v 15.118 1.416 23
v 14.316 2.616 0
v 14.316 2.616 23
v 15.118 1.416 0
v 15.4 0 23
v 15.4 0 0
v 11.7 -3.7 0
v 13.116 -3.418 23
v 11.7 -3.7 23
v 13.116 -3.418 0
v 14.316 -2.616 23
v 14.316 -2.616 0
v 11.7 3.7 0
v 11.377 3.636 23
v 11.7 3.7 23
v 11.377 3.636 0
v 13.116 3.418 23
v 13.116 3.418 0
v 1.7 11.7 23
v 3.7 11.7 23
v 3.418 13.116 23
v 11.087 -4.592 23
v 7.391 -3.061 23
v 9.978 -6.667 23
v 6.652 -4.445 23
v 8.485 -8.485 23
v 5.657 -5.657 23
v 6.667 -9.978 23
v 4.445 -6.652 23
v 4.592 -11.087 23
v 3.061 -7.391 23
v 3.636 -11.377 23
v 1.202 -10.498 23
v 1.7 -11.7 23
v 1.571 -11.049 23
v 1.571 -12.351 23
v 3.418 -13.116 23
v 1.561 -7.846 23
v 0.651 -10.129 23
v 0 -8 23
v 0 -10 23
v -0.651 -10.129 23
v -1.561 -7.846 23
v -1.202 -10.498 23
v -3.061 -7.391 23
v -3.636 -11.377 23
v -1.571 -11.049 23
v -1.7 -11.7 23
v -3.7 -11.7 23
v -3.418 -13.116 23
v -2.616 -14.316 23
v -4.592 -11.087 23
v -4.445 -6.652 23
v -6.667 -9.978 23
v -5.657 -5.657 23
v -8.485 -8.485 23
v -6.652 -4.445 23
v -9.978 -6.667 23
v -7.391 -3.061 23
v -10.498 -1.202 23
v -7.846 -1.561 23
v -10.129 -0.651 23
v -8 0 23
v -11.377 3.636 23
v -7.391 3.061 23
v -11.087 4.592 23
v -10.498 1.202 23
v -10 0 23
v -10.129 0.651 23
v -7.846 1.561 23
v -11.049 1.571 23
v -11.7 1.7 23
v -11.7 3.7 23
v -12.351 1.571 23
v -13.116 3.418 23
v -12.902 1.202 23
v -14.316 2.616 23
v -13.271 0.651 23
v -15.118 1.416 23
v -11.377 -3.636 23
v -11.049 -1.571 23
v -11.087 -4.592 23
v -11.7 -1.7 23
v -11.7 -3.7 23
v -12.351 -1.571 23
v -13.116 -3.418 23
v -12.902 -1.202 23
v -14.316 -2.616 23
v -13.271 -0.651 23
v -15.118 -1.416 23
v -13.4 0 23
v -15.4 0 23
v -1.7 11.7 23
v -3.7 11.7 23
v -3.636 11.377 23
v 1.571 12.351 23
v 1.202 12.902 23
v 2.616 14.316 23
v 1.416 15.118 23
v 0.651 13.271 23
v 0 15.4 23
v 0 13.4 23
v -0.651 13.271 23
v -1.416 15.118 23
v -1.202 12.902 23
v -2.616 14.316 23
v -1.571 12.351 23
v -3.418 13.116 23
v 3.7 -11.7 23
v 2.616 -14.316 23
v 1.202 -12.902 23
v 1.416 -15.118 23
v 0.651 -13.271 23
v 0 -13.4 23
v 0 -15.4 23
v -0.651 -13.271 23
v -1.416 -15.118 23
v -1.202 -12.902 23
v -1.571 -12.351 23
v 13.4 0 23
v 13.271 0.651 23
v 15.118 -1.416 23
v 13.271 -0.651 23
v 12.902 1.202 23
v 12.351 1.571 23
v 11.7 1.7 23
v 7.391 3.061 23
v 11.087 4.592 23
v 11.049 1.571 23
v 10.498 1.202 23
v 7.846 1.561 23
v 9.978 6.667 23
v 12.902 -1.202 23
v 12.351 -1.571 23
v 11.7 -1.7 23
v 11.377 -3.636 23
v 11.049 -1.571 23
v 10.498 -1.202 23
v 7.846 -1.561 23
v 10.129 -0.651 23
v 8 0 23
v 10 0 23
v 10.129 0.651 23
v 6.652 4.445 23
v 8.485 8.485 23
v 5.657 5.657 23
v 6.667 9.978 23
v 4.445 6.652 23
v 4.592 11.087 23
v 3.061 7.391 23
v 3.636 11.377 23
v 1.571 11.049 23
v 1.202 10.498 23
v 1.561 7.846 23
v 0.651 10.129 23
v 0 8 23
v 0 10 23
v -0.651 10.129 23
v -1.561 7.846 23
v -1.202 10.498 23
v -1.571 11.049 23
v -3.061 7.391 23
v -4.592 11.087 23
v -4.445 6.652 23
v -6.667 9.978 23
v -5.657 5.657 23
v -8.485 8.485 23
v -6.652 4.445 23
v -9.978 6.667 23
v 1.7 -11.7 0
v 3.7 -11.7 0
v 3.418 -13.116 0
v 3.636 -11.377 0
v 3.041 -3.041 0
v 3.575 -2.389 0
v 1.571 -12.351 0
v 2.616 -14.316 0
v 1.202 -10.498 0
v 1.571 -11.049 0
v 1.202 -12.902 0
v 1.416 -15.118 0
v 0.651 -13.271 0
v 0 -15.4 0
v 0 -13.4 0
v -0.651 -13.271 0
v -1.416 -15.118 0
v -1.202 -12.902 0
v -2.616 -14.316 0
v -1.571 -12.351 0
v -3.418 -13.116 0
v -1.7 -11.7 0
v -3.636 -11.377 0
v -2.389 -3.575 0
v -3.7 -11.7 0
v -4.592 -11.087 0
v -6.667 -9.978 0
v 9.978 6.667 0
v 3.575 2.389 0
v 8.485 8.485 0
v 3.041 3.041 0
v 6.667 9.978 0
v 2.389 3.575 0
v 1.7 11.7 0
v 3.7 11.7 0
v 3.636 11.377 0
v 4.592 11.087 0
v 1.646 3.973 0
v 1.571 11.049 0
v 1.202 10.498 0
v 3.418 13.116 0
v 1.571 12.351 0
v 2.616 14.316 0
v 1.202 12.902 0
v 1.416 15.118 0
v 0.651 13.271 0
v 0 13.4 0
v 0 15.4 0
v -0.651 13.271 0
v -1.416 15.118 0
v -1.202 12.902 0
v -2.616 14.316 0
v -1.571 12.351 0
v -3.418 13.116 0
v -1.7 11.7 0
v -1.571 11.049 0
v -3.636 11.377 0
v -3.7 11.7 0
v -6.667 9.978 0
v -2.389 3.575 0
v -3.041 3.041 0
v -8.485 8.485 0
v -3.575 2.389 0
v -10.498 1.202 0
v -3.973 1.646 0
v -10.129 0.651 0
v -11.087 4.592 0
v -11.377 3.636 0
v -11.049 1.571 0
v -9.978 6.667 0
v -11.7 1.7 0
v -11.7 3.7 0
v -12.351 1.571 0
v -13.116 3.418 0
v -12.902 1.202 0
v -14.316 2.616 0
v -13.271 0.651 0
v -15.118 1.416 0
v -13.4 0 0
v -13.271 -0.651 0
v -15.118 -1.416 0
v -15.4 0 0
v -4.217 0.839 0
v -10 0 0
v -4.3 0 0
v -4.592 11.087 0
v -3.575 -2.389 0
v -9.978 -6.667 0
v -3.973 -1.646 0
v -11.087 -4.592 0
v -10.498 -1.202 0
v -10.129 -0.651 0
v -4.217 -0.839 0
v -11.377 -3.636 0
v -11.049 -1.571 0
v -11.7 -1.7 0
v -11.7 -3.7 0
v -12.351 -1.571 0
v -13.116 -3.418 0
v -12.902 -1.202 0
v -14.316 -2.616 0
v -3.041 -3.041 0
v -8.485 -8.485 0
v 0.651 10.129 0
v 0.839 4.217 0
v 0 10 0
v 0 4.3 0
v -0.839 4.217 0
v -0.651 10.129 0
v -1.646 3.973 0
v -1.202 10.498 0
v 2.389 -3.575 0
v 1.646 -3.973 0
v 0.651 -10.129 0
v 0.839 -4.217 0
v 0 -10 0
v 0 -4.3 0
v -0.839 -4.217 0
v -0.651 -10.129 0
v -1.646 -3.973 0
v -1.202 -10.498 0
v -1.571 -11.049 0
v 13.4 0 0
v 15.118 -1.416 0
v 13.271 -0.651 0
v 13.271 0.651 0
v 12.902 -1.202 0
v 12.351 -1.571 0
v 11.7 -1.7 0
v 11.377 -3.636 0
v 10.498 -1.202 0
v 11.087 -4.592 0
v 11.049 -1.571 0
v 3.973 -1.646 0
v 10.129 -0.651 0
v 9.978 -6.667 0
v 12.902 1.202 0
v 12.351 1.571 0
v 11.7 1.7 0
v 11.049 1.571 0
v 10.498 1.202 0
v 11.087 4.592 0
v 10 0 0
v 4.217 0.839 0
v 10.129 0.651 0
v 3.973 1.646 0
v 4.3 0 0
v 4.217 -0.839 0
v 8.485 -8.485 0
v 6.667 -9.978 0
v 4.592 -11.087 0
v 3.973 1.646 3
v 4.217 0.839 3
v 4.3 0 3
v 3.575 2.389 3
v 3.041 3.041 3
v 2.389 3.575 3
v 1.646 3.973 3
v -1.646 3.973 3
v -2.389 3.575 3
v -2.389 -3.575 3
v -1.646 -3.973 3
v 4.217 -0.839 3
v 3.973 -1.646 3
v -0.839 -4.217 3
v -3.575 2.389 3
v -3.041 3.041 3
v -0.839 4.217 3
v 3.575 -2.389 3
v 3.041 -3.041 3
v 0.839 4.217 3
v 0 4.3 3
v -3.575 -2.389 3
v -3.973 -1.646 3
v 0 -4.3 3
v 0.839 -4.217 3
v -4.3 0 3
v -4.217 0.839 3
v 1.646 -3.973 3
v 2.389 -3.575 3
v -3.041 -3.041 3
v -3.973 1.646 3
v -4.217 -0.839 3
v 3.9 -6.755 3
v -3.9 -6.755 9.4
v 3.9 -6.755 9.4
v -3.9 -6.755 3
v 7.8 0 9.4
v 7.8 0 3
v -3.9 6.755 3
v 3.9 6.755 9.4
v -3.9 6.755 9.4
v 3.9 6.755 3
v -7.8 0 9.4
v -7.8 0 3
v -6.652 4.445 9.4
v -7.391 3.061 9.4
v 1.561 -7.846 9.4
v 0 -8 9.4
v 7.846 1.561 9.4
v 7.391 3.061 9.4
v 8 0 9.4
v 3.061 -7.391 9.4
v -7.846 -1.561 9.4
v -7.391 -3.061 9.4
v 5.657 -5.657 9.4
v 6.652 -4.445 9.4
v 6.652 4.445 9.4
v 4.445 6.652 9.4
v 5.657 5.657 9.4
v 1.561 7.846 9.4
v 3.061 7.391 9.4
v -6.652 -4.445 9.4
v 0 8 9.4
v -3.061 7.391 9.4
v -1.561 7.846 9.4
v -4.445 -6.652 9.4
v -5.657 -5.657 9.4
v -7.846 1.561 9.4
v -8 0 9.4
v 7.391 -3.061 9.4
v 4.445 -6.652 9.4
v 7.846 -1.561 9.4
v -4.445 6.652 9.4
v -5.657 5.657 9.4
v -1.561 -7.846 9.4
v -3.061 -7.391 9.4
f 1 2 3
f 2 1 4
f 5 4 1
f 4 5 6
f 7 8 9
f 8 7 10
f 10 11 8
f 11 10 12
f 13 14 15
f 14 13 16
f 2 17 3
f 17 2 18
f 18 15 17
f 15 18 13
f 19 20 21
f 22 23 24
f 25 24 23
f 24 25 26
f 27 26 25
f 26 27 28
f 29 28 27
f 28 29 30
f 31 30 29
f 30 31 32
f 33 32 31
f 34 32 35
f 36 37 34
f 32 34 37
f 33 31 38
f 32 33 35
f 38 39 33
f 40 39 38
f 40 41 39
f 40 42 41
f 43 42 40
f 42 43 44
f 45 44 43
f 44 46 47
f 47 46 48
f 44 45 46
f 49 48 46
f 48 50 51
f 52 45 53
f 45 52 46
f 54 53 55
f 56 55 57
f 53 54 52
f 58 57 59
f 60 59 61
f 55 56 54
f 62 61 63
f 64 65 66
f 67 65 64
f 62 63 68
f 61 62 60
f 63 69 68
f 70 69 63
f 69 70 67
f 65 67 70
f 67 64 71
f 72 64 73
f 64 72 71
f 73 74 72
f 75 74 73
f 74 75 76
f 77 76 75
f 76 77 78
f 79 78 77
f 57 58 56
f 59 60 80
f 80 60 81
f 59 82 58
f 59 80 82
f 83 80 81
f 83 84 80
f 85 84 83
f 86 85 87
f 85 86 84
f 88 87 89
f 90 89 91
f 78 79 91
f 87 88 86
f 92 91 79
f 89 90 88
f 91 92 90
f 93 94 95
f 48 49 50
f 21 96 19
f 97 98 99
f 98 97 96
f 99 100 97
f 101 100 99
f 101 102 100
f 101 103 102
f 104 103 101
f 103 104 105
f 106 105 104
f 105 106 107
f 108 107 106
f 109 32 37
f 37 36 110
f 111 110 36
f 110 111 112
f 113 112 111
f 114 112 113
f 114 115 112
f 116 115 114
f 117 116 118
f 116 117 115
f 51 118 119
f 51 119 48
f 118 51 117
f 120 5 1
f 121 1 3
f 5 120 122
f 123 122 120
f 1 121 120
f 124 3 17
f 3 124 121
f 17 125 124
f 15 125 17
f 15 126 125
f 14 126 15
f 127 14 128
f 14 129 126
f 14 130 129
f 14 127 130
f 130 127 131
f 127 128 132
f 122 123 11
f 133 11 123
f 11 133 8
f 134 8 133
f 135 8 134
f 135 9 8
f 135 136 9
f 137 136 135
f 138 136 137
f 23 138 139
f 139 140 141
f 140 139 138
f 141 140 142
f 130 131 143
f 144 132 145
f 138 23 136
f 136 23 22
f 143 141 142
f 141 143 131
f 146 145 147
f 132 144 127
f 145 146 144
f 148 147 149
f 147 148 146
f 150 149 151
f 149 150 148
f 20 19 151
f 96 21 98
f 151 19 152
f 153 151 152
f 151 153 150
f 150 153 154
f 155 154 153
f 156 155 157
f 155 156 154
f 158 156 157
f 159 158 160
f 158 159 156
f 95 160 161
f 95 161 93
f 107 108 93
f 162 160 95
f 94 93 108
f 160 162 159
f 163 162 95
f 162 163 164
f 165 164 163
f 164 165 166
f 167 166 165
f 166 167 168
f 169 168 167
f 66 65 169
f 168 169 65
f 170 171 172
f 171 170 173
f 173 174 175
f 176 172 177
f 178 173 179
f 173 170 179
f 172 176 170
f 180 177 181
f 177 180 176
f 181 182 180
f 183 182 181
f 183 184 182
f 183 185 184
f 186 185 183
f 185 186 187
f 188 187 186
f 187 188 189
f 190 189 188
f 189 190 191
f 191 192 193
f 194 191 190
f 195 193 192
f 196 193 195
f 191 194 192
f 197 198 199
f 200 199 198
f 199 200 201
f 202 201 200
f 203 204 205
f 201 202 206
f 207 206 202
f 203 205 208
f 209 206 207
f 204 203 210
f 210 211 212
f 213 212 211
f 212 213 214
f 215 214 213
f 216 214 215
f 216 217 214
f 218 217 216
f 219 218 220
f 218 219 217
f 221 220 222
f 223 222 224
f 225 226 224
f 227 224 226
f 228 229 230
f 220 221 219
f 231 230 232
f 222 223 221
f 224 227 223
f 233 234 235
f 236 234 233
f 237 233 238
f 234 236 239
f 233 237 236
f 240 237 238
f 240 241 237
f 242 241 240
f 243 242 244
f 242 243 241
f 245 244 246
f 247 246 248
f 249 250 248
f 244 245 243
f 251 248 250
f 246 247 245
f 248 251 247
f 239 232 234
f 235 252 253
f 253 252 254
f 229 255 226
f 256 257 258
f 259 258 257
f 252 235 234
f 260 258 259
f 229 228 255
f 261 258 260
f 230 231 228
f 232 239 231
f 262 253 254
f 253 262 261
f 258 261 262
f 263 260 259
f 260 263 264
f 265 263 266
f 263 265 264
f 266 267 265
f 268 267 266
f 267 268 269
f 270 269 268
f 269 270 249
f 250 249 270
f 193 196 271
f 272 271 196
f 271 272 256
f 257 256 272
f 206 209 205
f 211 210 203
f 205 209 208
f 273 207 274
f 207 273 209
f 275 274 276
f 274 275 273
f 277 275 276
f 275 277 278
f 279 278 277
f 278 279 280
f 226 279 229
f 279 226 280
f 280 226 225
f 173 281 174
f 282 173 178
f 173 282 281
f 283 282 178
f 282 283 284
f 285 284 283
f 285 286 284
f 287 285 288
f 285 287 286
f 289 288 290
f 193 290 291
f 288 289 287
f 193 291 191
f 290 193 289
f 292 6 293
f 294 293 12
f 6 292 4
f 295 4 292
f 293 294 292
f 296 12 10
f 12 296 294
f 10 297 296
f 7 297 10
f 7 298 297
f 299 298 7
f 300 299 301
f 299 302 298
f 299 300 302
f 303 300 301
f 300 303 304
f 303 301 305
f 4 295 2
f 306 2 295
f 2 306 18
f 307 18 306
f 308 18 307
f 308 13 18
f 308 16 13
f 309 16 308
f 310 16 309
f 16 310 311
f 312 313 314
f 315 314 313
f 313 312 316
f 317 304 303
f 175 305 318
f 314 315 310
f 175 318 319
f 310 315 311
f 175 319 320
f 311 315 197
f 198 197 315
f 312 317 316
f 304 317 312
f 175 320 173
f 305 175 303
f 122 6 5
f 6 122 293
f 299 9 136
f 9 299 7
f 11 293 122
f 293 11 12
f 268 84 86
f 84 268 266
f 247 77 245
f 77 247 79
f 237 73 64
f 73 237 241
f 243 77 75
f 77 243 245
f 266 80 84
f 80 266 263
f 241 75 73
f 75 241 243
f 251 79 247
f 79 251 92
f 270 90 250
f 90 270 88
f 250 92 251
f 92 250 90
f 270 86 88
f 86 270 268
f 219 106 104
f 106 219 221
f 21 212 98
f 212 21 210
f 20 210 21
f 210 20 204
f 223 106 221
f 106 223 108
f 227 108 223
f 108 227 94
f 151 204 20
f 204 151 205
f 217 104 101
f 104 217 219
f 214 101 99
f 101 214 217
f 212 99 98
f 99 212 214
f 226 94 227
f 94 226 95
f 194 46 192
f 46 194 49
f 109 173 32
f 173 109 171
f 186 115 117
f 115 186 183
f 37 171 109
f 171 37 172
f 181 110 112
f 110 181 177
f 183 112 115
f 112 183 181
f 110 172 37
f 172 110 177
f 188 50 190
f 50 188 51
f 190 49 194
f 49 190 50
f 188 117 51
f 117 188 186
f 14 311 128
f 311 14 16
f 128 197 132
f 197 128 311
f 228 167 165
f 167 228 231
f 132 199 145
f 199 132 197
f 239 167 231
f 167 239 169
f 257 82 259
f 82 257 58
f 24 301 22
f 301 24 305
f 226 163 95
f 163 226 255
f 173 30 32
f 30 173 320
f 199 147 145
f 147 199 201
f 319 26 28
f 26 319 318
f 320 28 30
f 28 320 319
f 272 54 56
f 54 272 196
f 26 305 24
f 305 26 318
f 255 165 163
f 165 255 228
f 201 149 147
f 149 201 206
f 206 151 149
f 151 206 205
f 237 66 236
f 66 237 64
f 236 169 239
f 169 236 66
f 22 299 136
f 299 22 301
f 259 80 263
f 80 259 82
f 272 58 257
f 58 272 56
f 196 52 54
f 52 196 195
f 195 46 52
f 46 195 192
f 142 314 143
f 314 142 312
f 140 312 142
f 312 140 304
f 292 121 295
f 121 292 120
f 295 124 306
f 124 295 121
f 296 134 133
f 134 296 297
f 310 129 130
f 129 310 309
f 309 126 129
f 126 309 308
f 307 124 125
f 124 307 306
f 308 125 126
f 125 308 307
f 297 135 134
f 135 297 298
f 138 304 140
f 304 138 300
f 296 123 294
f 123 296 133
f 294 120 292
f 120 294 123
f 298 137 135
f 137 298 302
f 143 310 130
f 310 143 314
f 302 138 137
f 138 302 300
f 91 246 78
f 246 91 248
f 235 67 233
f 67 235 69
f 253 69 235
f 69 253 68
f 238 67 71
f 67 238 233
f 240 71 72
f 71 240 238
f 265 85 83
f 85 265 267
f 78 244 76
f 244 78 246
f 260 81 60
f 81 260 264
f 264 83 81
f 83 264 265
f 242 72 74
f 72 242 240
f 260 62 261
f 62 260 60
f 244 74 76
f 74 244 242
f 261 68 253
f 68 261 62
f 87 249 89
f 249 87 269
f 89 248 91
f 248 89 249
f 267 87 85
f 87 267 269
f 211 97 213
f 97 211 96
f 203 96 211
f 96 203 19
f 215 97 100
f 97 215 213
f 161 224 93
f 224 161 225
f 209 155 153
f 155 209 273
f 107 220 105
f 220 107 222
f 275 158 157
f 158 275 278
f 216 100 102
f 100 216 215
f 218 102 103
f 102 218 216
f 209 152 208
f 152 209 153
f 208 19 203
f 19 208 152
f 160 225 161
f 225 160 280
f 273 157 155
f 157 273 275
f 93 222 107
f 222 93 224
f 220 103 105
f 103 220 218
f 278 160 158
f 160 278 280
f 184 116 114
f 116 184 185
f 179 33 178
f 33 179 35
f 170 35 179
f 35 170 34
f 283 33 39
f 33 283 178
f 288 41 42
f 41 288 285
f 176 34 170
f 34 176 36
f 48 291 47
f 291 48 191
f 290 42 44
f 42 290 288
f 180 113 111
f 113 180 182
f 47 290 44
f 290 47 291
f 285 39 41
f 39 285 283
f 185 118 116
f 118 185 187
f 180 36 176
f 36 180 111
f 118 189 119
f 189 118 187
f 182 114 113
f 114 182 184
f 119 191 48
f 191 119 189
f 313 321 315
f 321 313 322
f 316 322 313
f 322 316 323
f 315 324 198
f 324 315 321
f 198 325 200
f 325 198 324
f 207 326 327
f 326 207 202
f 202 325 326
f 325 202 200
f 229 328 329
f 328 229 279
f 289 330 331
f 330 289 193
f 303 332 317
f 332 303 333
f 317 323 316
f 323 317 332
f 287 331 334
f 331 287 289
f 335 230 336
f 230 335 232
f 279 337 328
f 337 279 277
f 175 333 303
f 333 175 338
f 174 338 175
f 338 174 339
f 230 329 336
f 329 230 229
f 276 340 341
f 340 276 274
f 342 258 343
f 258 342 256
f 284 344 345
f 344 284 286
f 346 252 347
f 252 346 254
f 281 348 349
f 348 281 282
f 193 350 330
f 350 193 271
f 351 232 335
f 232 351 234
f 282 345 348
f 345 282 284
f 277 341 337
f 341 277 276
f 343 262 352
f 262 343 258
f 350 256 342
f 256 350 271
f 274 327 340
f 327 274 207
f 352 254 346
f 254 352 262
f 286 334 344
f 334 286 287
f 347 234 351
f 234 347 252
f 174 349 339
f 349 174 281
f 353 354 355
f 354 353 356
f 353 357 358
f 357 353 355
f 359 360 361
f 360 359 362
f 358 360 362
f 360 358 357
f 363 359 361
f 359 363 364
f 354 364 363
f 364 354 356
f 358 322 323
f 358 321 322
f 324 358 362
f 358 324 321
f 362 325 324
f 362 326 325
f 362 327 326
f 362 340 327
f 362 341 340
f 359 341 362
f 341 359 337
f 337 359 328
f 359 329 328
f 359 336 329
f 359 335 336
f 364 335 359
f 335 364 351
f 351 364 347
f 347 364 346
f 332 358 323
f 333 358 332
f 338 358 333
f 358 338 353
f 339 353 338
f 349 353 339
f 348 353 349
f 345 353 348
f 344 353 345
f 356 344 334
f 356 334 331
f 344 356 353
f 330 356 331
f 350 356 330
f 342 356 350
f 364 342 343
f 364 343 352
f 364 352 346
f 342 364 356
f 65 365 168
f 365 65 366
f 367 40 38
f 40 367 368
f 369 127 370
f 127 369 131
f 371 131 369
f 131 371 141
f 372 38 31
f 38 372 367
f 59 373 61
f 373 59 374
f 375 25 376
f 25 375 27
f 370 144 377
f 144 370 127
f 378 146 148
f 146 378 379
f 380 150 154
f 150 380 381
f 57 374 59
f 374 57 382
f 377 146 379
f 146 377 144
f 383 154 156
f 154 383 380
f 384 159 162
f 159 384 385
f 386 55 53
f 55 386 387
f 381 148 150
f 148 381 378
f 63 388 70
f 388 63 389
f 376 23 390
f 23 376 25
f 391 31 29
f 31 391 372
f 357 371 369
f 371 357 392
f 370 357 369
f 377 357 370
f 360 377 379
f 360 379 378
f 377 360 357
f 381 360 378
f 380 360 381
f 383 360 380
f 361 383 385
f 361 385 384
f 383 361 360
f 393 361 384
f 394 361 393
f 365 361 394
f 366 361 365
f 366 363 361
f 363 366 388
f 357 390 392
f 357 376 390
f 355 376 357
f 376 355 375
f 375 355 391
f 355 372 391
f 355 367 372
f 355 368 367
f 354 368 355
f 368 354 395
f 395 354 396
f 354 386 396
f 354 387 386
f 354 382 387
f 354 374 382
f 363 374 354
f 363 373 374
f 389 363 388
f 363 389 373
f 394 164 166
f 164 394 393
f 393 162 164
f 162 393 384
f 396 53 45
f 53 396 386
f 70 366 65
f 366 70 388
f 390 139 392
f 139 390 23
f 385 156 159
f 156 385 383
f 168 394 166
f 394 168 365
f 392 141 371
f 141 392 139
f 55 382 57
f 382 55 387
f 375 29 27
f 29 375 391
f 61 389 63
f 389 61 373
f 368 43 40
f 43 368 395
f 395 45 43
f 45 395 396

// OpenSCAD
// file: SpoolholderVars.scad
screwM3Diameter=3+0.4;
screwM3HolderDiameter=screwM3Diameter+2*2;
screwM3HolderRadius=screwM3HolderDiameter/2;
nutM3Height=2;
screw16M3Height=16;
screw30M3Height=30;

rodM8Diameter=8+0.6;
nutM8Diameter=14.4+1.2;
nutM8Height=6.4+1.0;

nutM8HolderDiameter=nutM8Diameter+2*3;
nutM8HolderRadius=nutM8HolderDiameter/2;


length=120;
bottomHeight=10;
topHeight=8;
topWidth=16;
connectorThickness=4;
bottomNutM8HoleHeight=nutM8Height+1.0;


bearingDiameter=28+0.8;
bearingHolderWallThickness=3;
bearingHolderDiameter=bearingDiameter+2*bearingHolderWallThickness;
bearingHolderRadius=bearingHolderDiameter/2;

bearingHolderLength=bearingHolderDiameter+2*screwM3HolderDiameter;
bearingHolderHoleDiameter=18;
bearingHolderBottomHeight=4;
bearingHolderScrewOffset=(bearingHolderLength-screwM3HolderDiameter)/2;
bearingHolderScrewHolderHeight=screw16M3Height-nutM3Height-topHeight;


coneHeight=5;
coneBigDiameter=56;
coneBigRadius=coneBigDiameter/2;
coneSmallDiameter=48;
coneSmallRadius=coneSmallDiameter/2;

coneNutHolderHoleDiameter=16;
coneNutHolderHoleRadius=coneNutHolderHoleDiameter/2;
coneNutHolderWallThickness=4;
coneNutHolderWithWallDiameter=coneNutHolderHoleDiameter+2*coneNutHolderWallThickness;
coneNutHolderScrewOffset=coneNutHolderHoleRadius+screwM3HolderRadius;
coneNutHolderBottomHeight=3;
coneNutHolderTotalHeight=screw30M3Height-nutM3Height-coneHeight;
coneNutHolderNutM8HoleHeight=nutM8Height-1.0;
// main file
include <SpoolholderVars.scad>

difference()
{
	union()
	{
		cylinder(d=coneNutHolderWithWallDiameter,h=coneNutHolderTotalHeight,$fn=32);
		
		// Screw holders
		for (t=[[1,0],[-1,0],[0,1],[0,-1]])
		translate([t[0]*coneNutHolderScrewOffset,t[1]*coneNutHolderScrewOffset,0])
		cylinder(d=screwM3HolderDiameter,h=coneNutHolderTotalHeight,$fn=16);
	}
	
	// Rod hole
	translate([0,0,-1])
	cylinder(d=rodM8Diameter,h=coneNutHolderBottomHeight+2,$fn=32);
	
	// Nut hole
	translate([0,0,coneNutHolderBottomHeight])
	cylinder(d=nutM8Diameter,h=coneNutHolderNutM8HoleHeight+1,$fn=6);
	
	// Big hole
	translate([0,0,coneNutHolderBottomHeight+coneNutHolderNutM8HoleHeight])
	cylinder(d=coneNutHolderHoleDiameter,h=coneNutHolderTotalHeight+1,$fn=32);
	
	// Screw holes
	for (t=[[1,0],[-1,0],[0,1],[0,-1]])
	translate([t[0]*coneNutHolderScrewOffset,t[1]*coneNutHolderScrewOffset,0])
	cylinder(d=screwM3Diameter,h=coneNutHolderTotalHeight,$fn=16);
}
